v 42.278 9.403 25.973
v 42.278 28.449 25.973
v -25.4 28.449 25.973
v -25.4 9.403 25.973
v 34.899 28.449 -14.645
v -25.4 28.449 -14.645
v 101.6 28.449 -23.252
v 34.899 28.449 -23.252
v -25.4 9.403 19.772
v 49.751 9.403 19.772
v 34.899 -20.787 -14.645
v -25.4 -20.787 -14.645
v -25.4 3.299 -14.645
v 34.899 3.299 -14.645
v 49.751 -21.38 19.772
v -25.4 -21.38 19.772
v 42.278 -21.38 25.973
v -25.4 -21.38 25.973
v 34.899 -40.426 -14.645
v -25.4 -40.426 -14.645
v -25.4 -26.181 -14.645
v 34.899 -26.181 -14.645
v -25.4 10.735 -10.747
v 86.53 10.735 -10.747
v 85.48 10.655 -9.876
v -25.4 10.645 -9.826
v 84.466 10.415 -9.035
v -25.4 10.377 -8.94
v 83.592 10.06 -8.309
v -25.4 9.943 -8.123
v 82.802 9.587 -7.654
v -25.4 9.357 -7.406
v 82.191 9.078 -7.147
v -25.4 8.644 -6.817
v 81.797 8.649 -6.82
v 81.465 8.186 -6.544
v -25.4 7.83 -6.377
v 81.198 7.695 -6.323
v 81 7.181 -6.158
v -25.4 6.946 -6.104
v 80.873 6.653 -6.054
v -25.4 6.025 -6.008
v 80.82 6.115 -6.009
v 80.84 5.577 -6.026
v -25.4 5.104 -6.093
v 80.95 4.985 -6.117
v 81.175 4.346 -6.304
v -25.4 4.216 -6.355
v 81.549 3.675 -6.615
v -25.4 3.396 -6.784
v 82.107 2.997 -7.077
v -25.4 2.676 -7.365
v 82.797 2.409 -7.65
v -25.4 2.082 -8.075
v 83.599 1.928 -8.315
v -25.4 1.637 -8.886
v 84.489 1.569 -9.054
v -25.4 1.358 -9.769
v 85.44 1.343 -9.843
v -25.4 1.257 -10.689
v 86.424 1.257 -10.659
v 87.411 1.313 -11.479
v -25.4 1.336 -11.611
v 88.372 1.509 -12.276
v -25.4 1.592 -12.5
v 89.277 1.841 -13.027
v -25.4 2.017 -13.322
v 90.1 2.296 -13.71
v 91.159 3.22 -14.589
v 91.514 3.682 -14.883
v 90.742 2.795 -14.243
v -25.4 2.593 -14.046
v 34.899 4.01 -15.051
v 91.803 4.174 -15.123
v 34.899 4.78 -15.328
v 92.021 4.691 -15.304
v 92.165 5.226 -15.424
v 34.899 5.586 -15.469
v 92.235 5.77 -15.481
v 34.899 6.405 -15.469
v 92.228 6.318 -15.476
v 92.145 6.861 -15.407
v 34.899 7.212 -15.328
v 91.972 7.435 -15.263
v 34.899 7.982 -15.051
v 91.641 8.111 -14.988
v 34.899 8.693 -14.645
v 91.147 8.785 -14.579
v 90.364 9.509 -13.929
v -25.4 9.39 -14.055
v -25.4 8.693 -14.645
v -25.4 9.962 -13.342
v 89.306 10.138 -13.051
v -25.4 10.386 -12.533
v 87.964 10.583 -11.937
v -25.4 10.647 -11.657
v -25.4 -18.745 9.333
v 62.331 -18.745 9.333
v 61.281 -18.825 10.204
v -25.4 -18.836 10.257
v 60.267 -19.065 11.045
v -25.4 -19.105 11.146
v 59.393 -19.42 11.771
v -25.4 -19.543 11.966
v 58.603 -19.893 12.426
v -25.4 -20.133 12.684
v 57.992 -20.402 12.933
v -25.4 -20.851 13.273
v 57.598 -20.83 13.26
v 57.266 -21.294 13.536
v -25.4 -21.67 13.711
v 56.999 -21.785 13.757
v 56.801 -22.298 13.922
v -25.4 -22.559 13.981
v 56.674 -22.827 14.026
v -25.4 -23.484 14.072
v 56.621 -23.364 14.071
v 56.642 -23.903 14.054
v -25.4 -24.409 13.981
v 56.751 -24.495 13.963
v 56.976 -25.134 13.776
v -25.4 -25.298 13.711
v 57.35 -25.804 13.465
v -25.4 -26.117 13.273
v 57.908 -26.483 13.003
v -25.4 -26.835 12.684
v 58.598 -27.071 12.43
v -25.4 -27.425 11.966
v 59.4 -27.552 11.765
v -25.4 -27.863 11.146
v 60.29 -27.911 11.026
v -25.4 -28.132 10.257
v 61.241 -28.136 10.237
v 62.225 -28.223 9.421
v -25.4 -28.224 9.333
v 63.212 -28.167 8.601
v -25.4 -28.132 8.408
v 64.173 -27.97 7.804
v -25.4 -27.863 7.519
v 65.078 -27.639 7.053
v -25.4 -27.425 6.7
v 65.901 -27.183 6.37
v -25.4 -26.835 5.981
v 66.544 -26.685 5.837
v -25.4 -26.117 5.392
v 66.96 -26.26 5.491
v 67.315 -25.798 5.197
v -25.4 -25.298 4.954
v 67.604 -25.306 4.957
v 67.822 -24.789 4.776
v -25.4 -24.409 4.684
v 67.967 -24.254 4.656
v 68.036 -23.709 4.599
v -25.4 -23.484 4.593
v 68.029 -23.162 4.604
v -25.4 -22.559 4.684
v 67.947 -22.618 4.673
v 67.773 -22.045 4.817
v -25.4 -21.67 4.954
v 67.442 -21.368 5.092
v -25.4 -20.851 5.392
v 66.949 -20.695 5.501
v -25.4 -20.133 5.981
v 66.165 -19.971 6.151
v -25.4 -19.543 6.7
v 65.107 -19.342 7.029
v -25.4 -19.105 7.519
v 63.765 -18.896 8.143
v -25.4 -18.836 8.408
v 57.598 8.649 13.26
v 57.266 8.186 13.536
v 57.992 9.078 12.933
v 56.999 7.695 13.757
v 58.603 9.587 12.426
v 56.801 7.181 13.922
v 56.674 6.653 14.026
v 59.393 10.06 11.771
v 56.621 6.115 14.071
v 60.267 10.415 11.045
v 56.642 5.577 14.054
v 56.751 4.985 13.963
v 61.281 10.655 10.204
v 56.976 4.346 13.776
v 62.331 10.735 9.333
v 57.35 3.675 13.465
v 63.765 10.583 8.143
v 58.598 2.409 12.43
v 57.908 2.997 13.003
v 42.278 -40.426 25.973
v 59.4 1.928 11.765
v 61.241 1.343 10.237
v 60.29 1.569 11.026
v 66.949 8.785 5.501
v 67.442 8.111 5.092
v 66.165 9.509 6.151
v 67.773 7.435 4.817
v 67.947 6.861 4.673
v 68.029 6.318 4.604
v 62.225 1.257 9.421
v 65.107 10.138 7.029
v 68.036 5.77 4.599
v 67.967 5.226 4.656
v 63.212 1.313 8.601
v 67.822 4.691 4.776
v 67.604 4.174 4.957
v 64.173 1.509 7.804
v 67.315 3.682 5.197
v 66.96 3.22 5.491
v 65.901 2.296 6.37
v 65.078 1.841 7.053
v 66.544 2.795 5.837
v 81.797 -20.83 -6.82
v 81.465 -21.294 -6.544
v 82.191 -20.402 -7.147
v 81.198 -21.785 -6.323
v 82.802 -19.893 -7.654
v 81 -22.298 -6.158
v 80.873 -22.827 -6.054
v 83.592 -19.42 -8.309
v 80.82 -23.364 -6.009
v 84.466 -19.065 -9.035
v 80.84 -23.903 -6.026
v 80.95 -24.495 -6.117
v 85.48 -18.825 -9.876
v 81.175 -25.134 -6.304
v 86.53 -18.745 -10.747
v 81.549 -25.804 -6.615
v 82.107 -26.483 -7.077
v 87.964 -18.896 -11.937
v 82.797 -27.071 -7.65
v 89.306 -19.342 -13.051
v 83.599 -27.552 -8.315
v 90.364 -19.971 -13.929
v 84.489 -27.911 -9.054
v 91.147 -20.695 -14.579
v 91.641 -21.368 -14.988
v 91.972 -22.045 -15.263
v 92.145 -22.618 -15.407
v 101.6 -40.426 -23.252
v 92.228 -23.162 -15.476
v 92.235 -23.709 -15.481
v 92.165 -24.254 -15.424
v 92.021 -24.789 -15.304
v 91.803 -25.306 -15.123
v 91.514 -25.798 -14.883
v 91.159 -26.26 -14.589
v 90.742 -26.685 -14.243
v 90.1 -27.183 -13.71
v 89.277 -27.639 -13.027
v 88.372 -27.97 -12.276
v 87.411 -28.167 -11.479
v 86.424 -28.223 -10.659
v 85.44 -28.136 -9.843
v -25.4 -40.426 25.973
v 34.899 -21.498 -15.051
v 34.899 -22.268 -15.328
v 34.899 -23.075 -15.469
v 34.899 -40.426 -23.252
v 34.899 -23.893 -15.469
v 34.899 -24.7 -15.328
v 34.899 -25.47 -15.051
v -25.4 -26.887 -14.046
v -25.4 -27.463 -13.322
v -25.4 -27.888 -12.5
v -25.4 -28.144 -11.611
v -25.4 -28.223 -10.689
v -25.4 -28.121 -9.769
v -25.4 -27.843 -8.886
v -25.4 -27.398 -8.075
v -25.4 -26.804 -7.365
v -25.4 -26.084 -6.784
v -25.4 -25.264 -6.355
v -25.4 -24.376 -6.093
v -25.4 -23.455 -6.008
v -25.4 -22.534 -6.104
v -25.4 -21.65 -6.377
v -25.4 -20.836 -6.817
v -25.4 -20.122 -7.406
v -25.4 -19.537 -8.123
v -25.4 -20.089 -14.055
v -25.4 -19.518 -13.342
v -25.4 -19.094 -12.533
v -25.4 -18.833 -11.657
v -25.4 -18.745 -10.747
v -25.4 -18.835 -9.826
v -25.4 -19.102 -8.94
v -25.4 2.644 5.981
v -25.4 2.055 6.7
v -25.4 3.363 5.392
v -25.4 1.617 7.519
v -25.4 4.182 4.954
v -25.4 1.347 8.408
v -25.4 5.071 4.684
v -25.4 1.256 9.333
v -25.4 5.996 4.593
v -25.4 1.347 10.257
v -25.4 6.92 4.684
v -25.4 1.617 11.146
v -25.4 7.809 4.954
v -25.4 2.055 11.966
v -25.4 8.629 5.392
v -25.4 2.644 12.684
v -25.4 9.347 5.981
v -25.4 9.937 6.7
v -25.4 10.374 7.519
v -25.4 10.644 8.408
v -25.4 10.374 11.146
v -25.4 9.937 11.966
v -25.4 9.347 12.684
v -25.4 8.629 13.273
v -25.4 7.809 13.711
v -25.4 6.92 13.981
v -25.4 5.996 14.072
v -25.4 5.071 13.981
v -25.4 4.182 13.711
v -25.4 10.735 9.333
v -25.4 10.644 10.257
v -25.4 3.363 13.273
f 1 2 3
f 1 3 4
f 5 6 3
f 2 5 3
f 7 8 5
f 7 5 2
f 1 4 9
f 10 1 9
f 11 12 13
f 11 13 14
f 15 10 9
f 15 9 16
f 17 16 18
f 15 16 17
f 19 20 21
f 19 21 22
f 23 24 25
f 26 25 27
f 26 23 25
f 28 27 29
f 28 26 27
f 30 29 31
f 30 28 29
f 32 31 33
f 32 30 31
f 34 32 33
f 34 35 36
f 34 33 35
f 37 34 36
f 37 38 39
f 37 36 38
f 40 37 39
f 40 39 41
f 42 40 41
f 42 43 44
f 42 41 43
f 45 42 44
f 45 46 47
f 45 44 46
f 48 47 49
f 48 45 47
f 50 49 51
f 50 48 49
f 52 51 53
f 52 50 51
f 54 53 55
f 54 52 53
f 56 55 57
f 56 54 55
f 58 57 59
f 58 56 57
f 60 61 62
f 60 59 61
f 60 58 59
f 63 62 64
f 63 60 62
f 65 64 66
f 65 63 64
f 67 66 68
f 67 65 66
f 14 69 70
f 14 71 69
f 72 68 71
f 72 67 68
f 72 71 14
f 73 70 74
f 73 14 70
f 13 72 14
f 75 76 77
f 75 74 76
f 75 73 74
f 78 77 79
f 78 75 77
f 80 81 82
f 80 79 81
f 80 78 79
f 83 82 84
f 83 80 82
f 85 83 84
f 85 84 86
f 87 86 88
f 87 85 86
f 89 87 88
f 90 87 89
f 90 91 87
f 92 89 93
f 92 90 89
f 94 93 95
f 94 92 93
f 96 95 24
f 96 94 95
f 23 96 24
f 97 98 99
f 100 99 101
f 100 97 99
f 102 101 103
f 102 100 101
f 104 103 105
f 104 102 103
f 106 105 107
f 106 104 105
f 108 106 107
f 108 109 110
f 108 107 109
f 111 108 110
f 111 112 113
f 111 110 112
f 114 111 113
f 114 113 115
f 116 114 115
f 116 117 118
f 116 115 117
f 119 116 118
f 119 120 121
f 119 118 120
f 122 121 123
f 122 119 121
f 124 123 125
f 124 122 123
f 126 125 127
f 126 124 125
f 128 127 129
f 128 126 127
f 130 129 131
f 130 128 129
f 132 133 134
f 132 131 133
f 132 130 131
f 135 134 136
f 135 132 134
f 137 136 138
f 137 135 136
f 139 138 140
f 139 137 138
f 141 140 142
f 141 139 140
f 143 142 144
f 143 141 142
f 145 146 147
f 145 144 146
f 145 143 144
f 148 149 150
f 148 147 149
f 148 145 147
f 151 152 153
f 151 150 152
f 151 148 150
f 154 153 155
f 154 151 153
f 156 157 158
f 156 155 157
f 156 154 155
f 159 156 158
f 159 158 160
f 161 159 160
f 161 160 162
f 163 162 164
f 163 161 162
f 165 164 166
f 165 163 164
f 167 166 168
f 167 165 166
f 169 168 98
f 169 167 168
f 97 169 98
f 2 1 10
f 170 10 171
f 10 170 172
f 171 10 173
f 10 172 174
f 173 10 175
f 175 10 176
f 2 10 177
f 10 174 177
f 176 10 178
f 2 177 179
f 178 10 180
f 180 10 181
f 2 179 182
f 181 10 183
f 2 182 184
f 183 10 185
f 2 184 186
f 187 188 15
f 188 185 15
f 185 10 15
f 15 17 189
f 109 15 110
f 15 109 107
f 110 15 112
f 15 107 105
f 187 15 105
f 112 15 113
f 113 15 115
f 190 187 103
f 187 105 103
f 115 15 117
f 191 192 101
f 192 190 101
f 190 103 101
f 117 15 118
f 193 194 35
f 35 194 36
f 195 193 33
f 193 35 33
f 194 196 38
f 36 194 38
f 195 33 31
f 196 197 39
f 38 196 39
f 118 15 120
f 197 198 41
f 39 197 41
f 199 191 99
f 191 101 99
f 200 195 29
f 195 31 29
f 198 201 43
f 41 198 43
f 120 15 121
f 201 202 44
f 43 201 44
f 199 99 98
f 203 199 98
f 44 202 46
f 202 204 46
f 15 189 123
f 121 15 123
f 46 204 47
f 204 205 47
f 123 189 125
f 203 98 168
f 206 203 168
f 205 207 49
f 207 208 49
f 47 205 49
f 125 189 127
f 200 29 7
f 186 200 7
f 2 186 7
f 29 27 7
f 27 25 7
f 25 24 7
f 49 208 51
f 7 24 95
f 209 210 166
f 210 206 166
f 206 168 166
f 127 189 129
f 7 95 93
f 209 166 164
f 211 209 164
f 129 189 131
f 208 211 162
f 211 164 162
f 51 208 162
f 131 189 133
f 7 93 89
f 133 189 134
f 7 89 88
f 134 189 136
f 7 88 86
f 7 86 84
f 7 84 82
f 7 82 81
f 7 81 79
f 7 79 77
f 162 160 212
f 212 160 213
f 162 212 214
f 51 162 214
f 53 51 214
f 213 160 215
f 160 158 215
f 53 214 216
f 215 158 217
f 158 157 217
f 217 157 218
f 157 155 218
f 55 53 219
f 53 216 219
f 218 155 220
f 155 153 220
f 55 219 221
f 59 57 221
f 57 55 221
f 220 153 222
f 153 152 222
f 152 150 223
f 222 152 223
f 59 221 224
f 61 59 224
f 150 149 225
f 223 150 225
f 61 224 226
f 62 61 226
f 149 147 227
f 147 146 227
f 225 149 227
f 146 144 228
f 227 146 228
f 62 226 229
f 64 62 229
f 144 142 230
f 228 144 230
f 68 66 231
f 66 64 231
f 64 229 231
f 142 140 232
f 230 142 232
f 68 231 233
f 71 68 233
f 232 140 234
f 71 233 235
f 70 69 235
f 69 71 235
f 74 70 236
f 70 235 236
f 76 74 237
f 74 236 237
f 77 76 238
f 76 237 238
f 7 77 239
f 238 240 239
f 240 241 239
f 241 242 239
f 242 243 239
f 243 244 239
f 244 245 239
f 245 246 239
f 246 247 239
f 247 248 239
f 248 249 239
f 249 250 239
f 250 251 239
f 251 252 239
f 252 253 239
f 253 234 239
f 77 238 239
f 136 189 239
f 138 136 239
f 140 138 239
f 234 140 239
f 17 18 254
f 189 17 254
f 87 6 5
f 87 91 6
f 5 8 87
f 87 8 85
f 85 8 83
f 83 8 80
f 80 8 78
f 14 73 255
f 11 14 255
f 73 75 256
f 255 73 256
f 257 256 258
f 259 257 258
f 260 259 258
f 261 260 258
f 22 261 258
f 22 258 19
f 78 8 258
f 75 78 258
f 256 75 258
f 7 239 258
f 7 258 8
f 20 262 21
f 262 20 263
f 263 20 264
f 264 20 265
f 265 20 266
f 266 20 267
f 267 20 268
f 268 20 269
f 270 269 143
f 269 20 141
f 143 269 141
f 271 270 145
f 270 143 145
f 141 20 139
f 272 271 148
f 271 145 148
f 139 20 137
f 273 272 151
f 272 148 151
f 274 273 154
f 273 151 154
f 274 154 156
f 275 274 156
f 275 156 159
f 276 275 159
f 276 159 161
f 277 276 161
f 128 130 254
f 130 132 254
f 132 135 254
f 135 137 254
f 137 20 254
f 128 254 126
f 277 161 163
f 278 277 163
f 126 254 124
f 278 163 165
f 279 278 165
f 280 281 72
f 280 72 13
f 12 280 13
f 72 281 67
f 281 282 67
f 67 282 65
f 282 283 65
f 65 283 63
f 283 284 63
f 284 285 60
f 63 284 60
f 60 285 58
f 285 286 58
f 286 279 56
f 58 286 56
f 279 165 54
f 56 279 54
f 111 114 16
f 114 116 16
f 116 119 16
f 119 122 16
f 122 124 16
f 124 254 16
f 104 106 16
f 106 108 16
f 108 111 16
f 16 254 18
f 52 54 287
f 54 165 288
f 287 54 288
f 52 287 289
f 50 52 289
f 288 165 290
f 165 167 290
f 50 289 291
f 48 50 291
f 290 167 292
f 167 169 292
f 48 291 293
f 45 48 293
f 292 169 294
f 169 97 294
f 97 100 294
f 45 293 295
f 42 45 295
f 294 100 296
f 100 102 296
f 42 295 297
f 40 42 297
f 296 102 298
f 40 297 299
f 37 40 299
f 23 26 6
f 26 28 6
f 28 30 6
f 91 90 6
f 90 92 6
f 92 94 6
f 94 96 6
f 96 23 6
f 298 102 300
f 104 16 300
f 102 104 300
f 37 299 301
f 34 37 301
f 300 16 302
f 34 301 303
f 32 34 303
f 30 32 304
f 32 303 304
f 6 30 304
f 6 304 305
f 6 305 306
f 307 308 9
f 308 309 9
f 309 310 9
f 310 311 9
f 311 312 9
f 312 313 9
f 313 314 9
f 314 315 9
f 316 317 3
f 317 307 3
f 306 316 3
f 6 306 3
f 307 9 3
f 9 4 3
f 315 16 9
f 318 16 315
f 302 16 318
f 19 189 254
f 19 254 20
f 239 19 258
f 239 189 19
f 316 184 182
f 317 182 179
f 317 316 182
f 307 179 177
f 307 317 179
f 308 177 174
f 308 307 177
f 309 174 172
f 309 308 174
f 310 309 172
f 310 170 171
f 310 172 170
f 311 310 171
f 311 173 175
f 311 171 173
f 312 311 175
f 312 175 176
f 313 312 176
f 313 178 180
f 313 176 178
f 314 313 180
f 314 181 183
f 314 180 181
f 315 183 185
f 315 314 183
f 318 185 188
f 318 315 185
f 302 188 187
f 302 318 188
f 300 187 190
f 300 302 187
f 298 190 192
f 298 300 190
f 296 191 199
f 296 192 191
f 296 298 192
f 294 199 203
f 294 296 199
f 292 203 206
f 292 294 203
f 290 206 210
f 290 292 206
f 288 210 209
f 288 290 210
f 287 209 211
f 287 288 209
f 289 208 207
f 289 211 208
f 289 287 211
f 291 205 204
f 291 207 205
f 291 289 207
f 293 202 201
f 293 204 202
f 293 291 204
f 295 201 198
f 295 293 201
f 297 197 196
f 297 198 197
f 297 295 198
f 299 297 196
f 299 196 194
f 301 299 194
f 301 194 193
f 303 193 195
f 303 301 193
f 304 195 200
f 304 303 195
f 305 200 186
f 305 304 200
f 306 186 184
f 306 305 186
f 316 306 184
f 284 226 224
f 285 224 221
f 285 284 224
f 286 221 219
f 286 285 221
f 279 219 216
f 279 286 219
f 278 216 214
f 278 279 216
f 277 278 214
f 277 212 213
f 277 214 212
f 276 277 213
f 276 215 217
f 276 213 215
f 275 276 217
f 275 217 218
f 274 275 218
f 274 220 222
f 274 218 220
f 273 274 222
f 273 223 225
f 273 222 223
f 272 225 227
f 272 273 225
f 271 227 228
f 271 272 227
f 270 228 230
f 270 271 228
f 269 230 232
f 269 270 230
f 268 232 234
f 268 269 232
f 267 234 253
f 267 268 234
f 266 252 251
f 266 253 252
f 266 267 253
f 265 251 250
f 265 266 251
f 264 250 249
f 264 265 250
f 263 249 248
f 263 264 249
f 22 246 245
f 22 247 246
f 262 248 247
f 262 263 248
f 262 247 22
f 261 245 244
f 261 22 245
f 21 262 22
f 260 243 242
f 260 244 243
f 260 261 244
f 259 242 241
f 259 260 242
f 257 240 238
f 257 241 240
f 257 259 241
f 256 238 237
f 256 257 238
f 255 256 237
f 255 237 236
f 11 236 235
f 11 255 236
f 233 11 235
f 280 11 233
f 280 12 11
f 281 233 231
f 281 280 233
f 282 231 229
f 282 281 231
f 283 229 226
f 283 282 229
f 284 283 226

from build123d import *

# Parameters (mm, degrees)
F0_R          = 4.739513
F1_DEPTH      = 101.6
F1_DEPTH_BACK = 25.4
F3_DEPTH      = 68.875959
F4_W          = 60.299049
F4_H          = 8.607775
F5_DEPTH      = 68.875959


with BuildPart() as f1:
    # F0 (on Right) → F1 (new body, two sides)
    with BuildSketch(Plane.YZ) as f1_sk:
        Polygon((-21.380141, 25.972585), (-40.425949, 25.972585), (-40.425949, -23.252495), (28.44901, -23.252495), (28.44901, 25.972585), (9.403203, 25.972585), (9.403203, 19.771623), (-21.380141, 19.771623), align=None)
        with Locations((-23.484038, -10.747273)):
            Circle(F0_R, mode=Mode.SUBTRACT)
        with Locations((5.995752, -10.747273)):
            Circle(F0_R, mode=Mode.SUBTRACT)
        with Locations((-23.484038, 9.332708)):
            Circle(F0_R, mode=Mode.SUBTRACT)
        with Locations((5.995752, 9.332708)):
            Circle(F0_R, mode=Mode.SUBTRACT)
    extrude(amount=F1_DEPTH)
    extrude(f1_sk.sketch, amount=-F1_DEPTH_BACK)

    # F2 (on face) → F3 (cut, through all)
    with BuildSketch(Plane.XZ.offset(40.425949)):
        Polygon((101.6, 25.972585), (42.277858, 25.972585), (101.6, -23.252495), align=None)
    extrude(amount=-F3_DEPTH, mode=Mode.SUBTRACT)

    # F4 (on face) → F5 (cut, through all)
    with BuildSketch(Plane.XZ.offset(40.425949)):
        with Locations((4.749524, -18.948608)):
            Rectangle(F4_W, F4_H)
    extrude(amount=-F5_DEPTH, mode=Mode.SUBTRACT)


solid = f1.part
